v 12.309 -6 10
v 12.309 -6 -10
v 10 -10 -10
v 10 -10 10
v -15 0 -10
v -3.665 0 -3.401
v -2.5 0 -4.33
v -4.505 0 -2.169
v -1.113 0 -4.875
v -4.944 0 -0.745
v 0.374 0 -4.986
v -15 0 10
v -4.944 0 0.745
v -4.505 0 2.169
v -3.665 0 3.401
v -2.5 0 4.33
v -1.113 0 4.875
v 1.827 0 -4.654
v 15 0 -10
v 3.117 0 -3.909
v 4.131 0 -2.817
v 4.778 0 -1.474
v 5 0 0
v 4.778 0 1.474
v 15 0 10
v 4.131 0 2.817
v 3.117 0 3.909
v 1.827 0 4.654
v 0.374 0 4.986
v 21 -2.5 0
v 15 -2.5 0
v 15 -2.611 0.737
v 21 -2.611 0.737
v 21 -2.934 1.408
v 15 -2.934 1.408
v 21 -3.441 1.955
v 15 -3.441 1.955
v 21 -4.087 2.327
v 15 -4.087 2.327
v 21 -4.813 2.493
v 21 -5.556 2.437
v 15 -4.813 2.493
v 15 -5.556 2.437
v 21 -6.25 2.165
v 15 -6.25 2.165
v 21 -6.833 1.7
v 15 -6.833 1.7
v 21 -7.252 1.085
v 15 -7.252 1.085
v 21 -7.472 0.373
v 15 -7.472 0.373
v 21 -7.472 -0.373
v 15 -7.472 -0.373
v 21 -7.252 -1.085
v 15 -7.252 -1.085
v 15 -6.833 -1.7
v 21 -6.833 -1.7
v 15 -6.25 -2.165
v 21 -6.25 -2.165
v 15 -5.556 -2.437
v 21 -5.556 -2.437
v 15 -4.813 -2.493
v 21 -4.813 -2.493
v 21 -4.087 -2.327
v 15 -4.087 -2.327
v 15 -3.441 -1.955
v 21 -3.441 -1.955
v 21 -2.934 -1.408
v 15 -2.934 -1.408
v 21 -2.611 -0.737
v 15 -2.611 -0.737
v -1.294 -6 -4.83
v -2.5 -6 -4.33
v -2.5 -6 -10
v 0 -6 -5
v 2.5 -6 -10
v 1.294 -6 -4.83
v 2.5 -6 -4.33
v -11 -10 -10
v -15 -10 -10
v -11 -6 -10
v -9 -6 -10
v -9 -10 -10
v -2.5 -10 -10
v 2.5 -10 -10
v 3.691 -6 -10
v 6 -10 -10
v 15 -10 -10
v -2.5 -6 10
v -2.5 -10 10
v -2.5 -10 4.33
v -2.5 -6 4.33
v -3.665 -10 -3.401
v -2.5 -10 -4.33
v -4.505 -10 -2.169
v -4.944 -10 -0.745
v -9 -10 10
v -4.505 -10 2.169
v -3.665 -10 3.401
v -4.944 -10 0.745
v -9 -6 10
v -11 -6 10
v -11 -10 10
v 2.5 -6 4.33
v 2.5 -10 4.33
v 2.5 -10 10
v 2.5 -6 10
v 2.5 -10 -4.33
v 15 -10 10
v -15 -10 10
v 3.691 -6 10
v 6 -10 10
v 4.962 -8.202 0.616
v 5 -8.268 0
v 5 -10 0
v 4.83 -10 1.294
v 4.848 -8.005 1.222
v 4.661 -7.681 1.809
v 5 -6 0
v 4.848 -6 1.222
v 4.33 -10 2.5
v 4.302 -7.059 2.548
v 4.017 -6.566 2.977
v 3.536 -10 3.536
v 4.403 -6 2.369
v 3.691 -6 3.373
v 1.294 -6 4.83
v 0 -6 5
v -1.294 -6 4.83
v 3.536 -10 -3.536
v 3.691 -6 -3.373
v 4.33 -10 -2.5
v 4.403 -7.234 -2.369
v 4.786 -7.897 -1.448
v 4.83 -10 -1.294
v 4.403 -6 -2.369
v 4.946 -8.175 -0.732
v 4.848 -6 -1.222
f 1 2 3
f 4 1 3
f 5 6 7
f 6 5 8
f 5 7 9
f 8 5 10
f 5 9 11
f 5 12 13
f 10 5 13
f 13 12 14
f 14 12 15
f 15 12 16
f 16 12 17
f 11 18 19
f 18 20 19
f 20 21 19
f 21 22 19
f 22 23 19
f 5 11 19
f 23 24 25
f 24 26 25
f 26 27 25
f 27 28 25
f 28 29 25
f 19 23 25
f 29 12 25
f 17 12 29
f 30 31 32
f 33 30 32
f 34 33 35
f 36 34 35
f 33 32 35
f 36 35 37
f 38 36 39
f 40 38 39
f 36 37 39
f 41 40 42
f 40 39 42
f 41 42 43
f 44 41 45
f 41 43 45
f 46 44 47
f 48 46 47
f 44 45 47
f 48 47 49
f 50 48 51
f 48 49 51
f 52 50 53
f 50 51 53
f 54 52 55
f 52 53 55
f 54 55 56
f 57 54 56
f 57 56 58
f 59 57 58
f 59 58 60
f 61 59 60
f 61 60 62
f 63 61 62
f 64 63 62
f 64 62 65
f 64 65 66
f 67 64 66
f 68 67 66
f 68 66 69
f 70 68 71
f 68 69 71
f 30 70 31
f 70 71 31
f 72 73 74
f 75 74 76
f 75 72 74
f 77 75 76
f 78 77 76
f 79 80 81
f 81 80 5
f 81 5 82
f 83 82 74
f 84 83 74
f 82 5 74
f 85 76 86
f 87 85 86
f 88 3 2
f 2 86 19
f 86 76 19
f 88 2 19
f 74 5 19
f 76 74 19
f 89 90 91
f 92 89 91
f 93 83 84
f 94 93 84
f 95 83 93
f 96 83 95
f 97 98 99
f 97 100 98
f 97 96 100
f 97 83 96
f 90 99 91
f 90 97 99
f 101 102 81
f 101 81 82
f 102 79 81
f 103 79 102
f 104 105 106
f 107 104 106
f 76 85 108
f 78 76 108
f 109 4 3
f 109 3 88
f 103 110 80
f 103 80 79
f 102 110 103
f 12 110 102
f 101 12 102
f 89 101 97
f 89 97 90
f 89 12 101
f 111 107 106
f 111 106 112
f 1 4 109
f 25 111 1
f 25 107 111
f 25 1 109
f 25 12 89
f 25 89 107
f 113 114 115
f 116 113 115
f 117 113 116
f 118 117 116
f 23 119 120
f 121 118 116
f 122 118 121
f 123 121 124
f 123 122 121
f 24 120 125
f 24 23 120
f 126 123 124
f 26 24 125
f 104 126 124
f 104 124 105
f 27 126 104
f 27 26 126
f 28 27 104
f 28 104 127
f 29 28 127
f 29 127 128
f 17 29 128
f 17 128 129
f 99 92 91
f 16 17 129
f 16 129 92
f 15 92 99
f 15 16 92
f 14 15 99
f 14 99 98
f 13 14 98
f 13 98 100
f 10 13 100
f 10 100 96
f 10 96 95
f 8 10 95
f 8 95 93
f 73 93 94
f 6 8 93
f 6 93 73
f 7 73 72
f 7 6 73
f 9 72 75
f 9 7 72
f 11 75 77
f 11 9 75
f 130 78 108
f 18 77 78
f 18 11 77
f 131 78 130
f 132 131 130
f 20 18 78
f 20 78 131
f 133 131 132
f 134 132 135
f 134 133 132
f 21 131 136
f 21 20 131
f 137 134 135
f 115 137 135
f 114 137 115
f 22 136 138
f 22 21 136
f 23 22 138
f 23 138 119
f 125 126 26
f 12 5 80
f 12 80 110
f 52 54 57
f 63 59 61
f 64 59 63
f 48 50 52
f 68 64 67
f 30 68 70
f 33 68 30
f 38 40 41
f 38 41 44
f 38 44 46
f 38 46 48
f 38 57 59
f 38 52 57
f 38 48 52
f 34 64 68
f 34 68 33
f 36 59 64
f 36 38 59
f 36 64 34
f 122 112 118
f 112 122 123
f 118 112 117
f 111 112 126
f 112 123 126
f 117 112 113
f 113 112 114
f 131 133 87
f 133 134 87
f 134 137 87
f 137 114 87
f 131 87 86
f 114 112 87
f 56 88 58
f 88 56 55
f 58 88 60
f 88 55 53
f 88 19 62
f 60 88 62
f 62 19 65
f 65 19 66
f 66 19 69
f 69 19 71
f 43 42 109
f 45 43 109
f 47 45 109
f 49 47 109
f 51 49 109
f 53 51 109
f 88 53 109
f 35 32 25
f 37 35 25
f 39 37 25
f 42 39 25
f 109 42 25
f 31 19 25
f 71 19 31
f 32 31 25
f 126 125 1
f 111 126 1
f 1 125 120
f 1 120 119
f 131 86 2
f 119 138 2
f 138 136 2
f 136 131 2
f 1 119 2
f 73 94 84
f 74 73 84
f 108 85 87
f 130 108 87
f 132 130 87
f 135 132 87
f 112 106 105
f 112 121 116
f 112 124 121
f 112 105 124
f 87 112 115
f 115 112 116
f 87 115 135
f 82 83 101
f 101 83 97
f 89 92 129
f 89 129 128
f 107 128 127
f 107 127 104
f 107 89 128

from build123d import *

# Parameters (mm, degrees)
F0_W     = 30
F0_H     = 20
F0_R     = 5
F1_DEPTH = 10
F2_W     = 2
F2_H     = 20
F3_DEPTH = 4
F5_DEPTH = 20
F6_R     = 2.5
F7_DEPTH = 6


with BuildPart() as f1:
    # F0 (on Front) → F1 (new body)
    with BuildSketch(Plane.XZ):
        Rectangle(F0_W, F0_H)
        Circle(F0_R, mode=Mode.SUBTRACT)
    extrude(amount=F1_DEPTH)

    # F2 (on face) → F3 (cut)
    with BuildSketch(Plane.XZ.offset(10)):
        with Locations((-10, 0)):
            Rectangle(F2_W, F2_H)
        with BuildLine():
            Line((2.5, 10), (-2.5, 10))
            Line((-2.5, 10), (-2.5, 4.330127))
            ThreePointArc((-2.5, 4.330127), (0, 5), (2.5, 4.330127))
            Line((2.5, 4.330127), (2.5, 10))
        make_face()
        with BuildLine():
            Line((-2.5, -4.330127), (-2.5, -10))
            Line((-2.5, -10), (2.5, -10))
            Line((2.5, -10), (2.5, -4.330127))
            ThreePointArc((2.5, -4.330127), (0, -5), (-2.5, -4.330127))
        make_face()
    extrude(amount=-F3_DEPTH, mode=Mode.SUBTRACT)

    # F4 (on face) → F5 (cut, through all)
    with BuildSketch(Plane(origin=(0, 0, -10), x_dir=(1, 0, 0), z_dir=(0, 0, -1))):
        Polygon((10, 10), (6, 10), (3.690599, 6), (12.309401, 6), align=None)
    extrude(amount=-F5_DEPTH, mode=Mode.SUBTRACT)

    # F6 (on face) → F7 (join)
    with BuildSketch(Plane.YZ.offset(15)):
        with Locations((-5, 0)):
            Circle(F6_R)
    extrude(amount=F7_DEPTH)


solid = f1.part
